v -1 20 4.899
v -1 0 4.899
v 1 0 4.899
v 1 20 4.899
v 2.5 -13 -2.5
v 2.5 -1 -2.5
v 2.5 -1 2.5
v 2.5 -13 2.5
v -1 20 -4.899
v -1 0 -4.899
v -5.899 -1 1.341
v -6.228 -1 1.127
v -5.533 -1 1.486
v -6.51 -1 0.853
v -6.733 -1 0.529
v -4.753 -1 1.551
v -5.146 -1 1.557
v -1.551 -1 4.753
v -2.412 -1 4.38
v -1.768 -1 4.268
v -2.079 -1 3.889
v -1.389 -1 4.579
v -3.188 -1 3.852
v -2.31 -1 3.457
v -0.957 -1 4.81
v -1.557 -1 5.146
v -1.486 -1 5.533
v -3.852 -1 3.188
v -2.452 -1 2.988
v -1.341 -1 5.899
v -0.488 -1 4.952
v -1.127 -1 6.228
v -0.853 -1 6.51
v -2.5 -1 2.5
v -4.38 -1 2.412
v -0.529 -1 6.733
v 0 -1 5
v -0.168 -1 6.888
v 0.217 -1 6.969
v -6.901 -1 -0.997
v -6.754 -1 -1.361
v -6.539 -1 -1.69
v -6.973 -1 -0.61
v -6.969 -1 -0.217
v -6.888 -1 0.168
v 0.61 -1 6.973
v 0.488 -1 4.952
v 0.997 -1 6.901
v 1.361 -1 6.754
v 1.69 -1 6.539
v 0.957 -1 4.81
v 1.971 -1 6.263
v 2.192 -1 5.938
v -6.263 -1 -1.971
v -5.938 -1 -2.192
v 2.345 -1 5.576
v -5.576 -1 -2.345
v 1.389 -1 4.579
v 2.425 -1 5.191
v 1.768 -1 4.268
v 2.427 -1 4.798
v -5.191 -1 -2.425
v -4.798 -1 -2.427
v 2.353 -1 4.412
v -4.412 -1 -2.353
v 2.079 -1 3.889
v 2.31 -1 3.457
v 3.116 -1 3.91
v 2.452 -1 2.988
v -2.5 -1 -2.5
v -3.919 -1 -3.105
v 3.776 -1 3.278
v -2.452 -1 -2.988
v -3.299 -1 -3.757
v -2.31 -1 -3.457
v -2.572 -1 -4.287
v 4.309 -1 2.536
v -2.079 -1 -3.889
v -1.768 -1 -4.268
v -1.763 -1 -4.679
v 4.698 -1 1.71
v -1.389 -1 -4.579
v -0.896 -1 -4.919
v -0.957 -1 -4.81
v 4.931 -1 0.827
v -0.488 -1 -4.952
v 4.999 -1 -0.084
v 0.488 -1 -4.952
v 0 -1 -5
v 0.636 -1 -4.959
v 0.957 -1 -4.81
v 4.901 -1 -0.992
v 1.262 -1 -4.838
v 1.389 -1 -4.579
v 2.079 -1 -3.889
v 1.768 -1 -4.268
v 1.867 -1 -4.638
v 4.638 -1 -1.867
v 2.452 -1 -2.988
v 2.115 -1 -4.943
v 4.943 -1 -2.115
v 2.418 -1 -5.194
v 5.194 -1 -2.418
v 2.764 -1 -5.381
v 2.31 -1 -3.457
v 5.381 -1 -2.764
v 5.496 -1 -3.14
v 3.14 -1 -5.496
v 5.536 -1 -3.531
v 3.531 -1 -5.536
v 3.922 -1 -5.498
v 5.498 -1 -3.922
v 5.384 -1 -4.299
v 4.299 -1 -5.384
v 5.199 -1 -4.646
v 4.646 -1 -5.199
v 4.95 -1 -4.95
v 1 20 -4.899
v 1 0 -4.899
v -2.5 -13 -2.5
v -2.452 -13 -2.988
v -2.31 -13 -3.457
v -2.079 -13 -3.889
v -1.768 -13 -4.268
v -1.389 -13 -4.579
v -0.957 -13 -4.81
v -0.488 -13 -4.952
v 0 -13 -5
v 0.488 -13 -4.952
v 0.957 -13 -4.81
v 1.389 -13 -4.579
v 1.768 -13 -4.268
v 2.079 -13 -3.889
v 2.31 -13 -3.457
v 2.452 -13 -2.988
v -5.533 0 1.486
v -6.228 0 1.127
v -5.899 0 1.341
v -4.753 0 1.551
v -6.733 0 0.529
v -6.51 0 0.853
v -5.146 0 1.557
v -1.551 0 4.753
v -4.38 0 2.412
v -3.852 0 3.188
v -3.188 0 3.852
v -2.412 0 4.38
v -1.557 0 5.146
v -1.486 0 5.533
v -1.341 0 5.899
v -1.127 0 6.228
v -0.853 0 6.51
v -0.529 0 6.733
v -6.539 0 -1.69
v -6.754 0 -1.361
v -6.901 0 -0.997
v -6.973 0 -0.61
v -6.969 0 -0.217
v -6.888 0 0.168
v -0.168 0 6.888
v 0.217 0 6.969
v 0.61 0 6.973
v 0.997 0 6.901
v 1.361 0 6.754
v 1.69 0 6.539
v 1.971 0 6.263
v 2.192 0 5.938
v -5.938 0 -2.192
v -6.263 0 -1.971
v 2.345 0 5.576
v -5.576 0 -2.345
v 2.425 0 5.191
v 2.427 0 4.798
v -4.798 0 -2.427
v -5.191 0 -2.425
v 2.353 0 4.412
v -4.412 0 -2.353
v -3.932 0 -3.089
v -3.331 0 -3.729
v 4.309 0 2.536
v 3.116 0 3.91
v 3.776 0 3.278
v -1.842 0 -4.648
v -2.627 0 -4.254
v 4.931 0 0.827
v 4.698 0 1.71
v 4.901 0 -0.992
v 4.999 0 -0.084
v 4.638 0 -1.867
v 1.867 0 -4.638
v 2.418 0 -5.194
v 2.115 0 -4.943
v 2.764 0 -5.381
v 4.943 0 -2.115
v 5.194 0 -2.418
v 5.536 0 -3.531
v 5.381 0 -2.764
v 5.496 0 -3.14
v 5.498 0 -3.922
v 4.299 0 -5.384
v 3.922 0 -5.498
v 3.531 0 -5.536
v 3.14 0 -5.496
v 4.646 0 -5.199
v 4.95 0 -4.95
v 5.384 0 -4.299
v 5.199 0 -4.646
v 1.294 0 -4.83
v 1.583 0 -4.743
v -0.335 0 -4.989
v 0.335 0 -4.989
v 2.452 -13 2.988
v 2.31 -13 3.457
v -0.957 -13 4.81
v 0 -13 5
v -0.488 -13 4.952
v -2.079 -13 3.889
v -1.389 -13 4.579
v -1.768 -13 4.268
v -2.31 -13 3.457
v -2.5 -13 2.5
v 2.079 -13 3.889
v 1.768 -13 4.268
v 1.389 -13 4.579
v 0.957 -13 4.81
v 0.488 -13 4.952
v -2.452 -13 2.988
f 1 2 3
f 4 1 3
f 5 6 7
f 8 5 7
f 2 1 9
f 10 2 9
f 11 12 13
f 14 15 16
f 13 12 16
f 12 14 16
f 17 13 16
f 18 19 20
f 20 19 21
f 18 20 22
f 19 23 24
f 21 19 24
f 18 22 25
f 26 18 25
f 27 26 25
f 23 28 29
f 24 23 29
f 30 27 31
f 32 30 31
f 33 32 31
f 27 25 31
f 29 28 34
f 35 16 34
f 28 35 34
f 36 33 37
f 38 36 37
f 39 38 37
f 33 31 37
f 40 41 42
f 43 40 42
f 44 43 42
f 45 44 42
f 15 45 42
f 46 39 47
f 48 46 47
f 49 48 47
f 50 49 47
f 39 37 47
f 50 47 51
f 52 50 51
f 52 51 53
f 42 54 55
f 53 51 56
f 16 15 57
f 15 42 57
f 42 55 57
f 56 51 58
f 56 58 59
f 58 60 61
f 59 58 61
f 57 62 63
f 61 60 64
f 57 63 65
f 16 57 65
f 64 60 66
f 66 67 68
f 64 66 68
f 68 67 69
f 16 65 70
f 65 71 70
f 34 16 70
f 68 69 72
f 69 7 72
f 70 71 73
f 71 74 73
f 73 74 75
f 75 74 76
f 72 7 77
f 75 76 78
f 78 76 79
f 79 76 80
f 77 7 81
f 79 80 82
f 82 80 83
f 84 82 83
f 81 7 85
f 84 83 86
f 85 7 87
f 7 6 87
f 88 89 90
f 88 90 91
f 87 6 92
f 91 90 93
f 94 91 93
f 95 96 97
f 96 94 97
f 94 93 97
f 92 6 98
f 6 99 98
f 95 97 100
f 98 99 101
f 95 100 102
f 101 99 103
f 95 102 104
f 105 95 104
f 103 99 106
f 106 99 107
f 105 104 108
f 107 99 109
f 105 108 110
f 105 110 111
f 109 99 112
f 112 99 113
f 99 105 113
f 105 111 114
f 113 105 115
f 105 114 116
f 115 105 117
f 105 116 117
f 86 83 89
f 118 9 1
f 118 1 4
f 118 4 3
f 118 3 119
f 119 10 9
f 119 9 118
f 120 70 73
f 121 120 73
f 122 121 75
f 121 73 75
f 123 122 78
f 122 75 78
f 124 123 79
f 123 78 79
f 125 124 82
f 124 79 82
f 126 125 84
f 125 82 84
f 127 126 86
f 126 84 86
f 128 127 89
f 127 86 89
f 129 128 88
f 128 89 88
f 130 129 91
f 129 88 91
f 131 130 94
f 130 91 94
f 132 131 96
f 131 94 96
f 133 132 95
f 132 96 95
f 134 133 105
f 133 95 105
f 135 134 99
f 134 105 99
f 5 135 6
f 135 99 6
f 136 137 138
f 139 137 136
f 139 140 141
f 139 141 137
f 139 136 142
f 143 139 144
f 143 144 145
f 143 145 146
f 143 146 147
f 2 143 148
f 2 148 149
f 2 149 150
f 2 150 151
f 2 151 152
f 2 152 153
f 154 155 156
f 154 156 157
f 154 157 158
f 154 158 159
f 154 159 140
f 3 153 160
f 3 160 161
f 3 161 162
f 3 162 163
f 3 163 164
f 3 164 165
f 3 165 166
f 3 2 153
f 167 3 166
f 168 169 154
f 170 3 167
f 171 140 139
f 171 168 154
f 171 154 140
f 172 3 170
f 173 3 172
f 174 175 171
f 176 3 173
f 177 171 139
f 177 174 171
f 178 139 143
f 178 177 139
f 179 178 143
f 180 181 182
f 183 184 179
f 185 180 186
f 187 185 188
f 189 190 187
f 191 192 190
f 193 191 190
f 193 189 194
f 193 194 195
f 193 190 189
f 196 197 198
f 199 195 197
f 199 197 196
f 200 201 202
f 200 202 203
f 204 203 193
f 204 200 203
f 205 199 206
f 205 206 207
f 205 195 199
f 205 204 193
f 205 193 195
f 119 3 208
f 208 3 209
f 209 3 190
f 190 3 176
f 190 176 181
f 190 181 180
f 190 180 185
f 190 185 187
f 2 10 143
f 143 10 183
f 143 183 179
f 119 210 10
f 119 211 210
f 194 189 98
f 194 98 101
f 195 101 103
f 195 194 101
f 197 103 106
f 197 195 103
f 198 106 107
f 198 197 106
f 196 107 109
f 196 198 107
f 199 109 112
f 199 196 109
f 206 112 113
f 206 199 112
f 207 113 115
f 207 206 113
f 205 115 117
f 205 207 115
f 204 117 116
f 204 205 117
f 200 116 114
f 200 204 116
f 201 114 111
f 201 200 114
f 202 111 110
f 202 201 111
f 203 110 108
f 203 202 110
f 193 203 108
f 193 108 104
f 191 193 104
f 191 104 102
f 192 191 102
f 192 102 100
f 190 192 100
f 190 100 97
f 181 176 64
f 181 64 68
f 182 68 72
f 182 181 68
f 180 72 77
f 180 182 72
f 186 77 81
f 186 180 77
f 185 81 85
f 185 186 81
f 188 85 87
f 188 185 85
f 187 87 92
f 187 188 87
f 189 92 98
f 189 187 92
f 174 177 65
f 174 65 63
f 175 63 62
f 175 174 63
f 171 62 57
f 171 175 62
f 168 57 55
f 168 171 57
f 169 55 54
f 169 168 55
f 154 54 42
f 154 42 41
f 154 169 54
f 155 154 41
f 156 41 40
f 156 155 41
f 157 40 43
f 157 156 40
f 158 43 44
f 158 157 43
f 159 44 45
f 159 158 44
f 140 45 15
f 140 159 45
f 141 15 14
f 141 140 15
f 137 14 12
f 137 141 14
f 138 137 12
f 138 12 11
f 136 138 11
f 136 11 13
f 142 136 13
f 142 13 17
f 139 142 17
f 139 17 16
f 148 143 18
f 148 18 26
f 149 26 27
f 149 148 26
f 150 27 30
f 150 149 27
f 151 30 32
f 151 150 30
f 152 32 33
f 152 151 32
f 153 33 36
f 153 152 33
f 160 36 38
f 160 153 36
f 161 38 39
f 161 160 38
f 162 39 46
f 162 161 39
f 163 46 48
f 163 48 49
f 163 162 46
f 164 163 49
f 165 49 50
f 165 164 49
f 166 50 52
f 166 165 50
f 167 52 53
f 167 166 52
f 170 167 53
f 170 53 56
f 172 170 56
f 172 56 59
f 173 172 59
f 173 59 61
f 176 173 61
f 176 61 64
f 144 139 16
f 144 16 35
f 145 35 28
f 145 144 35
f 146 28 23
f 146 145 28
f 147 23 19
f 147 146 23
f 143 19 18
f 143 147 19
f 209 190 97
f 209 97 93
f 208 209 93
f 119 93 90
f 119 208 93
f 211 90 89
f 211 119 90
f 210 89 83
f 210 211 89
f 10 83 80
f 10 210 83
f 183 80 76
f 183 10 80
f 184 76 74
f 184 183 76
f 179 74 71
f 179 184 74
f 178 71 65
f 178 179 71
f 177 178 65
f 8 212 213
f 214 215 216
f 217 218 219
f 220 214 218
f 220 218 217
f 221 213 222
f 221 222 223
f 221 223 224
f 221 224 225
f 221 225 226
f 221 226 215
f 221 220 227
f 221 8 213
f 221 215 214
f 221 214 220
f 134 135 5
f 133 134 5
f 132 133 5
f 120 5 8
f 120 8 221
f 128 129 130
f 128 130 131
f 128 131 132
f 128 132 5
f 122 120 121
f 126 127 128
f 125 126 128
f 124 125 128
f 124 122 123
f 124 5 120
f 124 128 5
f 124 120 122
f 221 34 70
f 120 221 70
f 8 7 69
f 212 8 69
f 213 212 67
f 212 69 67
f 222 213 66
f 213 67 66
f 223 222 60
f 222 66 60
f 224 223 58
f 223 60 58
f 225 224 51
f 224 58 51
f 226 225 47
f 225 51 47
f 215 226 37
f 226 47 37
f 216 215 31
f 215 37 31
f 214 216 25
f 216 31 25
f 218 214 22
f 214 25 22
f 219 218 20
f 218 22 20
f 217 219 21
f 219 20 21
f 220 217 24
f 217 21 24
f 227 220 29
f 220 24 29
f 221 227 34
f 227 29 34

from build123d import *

# Parameters (mm, degrees)
BOSS_EXTRUDE1_DEPTH = 13
BOSS_EXTRUDE2_DEPTH = 1
SKETCH1_5_W         = 2
SKETCH1_5_H         = 9.797958972
BOSS_EXTRUDE3_DEPTH = 20


with BuildPart() as part:
    # Sketch1 → Boss-Extrude1 (new body)
    with BuildSketch(Plane(origin=(0, 0, 0), x_dir=(1, 0, 0), z_dir=(0, 1, 0))):
        with BuildLine():
            Line((2.5, 2.5), (2.5, -2.5))
            ThreePointArc((2.5, -2.5), (0, -5), (-2.5, -2.5))
            Line((-2.5, -2.5), (-2.5, 2.5))
            ThreePointArc((-2.5, 2.5), (0, 5), (2.5, 2.5))
        make_face()
    extrude(amount=-BOSS_EXTRUDE1_DEPTH)

    # Sketch1<3> → Boss-Extrude2 (add)
    with BuildSketch(Plane(origin=(0, 0, 0), x_dir=(1, 0, 0), z_dir=(0, 1, 0))):
        with BuildLine():
            ThreePointArc((1.867050547, 4.63833184), (-1.710100717, 4.698463104), (-4.411705933, 2.353051372))
            ThreePointArc((-4.411705933, 2.353051372), (-6.973362887, 0.610090199), (-4.75328529, -1.551218539))
            ThreePointArc((-4.75328529, -1.551218539), (-3.535533906, -3.535533906), (-1.551218539, -4.75328529))
            ThreePointArc((-1.551218539, -4.75328529), (0.610090199, -6.973362887), (2.353051372, -4.411705933))
            ThreePointArc((2.353051372, -4.411705933), (4.698463104, -1.710100717), (4.63833184, 1.867050547))
            ThreePointArc((4.63833184, 1.867050547), (4.949747468, 4.949747468), (1.867050547, 4.63833184))
        make_face()
    extrude(amount=-BOSS_EXTRUDE2_DEPTH)

    # Sketch1<5> → Boss-Extrude3 (add)
    with BuildSketch(Plane(origin=(0, 0, 0), x_dir=(1, 0, 0), z_dir=(0, 1, 0))):
        Rectangle(SKETCH1_5_W, SKETCH1_5_H)
    extrude(amount=BOSS_EXTRUDE3_DEPTH)


solid = part.part
